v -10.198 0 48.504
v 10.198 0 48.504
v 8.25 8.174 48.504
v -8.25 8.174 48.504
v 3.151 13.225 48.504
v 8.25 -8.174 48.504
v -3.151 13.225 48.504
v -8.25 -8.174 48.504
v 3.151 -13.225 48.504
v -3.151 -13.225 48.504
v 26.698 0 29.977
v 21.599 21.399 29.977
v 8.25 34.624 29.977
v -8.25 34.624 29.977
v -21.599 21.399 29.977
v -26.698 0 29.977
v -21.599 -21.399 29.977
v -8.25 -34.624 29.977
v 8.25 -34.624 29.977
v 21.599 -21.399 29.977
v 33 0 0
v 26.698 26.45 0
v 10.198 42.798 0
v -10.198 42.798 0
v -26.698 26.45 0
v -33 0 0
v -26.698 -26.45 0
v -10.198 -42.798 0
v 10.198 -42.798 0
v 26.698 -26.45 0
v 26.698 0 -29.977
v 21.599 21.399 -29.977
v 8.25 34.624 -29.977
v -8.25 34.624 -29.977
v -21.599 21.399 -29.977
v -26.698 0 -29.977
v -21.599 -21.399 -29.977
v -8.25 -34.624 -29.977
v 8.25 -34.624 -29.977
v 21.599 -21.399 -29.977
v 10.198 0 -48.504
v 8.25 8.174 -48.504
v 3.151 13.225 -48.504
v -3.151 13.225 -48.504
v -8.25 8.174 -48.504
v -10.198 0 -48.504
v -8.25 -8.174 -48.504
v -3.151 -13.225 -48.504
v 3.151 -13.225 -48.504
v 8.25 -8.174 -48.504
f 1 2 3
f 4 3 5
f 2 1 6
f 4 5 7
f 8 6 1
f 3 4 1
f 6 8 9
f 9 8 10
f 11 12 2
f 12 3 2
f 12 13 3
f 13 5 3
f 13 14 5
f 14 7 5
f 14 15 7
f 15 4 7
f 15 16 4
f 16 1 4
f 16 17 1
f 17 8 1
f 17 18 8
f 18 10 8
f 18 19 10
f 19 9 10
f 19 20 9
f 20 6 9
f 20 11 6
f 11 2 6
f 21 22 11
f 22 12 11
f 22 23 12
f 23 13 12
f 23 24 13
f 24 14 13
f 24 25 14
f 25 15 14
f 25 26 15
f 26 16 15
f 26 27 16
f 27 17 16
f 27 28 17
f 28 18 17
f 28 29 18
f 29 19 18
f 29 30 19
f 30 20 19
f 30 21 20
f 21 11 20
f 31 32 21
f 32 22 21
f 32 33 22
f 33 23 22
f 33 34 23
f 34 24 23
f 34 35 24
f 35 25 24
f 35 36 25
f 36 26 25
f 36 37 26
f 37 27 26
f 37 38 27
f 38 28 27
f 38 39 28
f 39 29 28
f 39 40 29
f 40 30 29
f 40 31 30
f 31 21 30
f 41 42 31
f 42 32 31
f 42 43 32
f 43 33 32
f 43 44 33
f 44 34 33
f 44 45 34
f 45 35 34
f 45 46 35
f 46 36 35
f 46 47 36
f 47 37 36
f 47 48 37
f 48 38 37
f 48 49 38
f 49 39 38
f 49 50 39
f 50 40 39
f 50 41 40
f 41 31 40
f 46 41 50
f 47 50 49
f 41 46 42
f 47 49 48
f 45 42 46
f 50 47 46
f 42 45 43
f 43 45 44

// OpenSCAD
// Generated by SolidPython 1.0.1 on 2020-07-29 00:46:50


scale(v = [11, 15, 17]) {
	sphere(r = 3);
}
/***********************************************
*********      SolidPython code:      **********
************************************************
 
# import packages: SolidPython
from solid import *
from solid.utils import *
from itertools import chain, combinations, permutations


class Resize:

    def __init__(self, scad_file):
        self.scad_file = scad_file
        #self.scad_file = import_scad(scad_file)
        # cone/cylinder param:
        self.r1 = 0
        self.r2 = 0
        self.h = 0
        # rectangular prism param:
        self.w = 0
        self.l = 0
        # ellipse param:
        self.r = 0

    # import OpenScad code (file name corresponds to shape)


    # classify shape + parameters
    def assign(self, param1, param2, param3):
        if self.scad_file == 'cone.scad':
            self.r1 = param1
            self.r2 = param2
            self.h = param3
        elif self.scad_file == 'cylinder.scad':
            self.r1 = param1
            self.r2 = param2
            self.h = param3
        elif self.scad_file == 'rectangularPrism.scad':
            self.h = param1
            self.l = param2
            self.w = param3
        else:
            self.r = param1
            self.h = param2

    # resize parameters
    def iterate(self):
        x = range(3, 20, 2)
        i = 1
        if self.scad_file == 'cone.scad':
            tempList = list(permutations(x, 2))
            for temp in tempList:
                param1 = temp[0]
                param2 = temp[1]
                filepath = 'produced_scad_files/' + 'cone' + str(param1) + '_' + str(param2) + '_' + '.scad'
                scad_render_to_file(cylinder(h=param1, r1=param2, r2=0), filepath)

        elif self.scad_file == 'cylinder.scad':
            tempList = list(permutations(x, 3))
            for temp in tempList:
                param1 = temp[0]
                param2 = temp[1]
                filepath = 'produced_scad_files/' + 'cylinder' + str(param1) + '_' + str(param2) + '_' + '.scad'
                scad_render_to_file(cylinder(h=param1, r1=param2, r2=param2), filepath)

        elif self.scad_file == 'rectangularPrism.scad':
            tempList = list(permutations(x, 3))
            for temp in tempList:
                param1 = temp[0]
                param2 = temp[1]
                param3 = temp[2]
                filepath = 'produced_scad_files/' + 'rectangularPrism' + str(param1) + '_' + str(param2) + '_' + str(
                    param3) + '.scad'
                scad_render_to_file(cube(size=(param1, param2, param3)), filepath)

        elif self.scad_file == 'ellipse.scad':
            tempList = list(permutations(x, 4))
            for temp in tempList:
                param1 = temp[0]
                param2 = temp[1]
                param3 = temp[2]
                param4 = temp[3]
                filepath = 'produced_scad_files/' + 'ellipse' + str(param1) + '_' + str(param2) + '_' + str(param3) + '_' + str(param4) + '.scad'
                scad_render_to_file(scale([param1, param2, param3])(sphere(r=param4)), filepath)

    def render_to_scadfile(self):
        scad_render_to_file(scad, 'example.scad') 
 
************************************************/
